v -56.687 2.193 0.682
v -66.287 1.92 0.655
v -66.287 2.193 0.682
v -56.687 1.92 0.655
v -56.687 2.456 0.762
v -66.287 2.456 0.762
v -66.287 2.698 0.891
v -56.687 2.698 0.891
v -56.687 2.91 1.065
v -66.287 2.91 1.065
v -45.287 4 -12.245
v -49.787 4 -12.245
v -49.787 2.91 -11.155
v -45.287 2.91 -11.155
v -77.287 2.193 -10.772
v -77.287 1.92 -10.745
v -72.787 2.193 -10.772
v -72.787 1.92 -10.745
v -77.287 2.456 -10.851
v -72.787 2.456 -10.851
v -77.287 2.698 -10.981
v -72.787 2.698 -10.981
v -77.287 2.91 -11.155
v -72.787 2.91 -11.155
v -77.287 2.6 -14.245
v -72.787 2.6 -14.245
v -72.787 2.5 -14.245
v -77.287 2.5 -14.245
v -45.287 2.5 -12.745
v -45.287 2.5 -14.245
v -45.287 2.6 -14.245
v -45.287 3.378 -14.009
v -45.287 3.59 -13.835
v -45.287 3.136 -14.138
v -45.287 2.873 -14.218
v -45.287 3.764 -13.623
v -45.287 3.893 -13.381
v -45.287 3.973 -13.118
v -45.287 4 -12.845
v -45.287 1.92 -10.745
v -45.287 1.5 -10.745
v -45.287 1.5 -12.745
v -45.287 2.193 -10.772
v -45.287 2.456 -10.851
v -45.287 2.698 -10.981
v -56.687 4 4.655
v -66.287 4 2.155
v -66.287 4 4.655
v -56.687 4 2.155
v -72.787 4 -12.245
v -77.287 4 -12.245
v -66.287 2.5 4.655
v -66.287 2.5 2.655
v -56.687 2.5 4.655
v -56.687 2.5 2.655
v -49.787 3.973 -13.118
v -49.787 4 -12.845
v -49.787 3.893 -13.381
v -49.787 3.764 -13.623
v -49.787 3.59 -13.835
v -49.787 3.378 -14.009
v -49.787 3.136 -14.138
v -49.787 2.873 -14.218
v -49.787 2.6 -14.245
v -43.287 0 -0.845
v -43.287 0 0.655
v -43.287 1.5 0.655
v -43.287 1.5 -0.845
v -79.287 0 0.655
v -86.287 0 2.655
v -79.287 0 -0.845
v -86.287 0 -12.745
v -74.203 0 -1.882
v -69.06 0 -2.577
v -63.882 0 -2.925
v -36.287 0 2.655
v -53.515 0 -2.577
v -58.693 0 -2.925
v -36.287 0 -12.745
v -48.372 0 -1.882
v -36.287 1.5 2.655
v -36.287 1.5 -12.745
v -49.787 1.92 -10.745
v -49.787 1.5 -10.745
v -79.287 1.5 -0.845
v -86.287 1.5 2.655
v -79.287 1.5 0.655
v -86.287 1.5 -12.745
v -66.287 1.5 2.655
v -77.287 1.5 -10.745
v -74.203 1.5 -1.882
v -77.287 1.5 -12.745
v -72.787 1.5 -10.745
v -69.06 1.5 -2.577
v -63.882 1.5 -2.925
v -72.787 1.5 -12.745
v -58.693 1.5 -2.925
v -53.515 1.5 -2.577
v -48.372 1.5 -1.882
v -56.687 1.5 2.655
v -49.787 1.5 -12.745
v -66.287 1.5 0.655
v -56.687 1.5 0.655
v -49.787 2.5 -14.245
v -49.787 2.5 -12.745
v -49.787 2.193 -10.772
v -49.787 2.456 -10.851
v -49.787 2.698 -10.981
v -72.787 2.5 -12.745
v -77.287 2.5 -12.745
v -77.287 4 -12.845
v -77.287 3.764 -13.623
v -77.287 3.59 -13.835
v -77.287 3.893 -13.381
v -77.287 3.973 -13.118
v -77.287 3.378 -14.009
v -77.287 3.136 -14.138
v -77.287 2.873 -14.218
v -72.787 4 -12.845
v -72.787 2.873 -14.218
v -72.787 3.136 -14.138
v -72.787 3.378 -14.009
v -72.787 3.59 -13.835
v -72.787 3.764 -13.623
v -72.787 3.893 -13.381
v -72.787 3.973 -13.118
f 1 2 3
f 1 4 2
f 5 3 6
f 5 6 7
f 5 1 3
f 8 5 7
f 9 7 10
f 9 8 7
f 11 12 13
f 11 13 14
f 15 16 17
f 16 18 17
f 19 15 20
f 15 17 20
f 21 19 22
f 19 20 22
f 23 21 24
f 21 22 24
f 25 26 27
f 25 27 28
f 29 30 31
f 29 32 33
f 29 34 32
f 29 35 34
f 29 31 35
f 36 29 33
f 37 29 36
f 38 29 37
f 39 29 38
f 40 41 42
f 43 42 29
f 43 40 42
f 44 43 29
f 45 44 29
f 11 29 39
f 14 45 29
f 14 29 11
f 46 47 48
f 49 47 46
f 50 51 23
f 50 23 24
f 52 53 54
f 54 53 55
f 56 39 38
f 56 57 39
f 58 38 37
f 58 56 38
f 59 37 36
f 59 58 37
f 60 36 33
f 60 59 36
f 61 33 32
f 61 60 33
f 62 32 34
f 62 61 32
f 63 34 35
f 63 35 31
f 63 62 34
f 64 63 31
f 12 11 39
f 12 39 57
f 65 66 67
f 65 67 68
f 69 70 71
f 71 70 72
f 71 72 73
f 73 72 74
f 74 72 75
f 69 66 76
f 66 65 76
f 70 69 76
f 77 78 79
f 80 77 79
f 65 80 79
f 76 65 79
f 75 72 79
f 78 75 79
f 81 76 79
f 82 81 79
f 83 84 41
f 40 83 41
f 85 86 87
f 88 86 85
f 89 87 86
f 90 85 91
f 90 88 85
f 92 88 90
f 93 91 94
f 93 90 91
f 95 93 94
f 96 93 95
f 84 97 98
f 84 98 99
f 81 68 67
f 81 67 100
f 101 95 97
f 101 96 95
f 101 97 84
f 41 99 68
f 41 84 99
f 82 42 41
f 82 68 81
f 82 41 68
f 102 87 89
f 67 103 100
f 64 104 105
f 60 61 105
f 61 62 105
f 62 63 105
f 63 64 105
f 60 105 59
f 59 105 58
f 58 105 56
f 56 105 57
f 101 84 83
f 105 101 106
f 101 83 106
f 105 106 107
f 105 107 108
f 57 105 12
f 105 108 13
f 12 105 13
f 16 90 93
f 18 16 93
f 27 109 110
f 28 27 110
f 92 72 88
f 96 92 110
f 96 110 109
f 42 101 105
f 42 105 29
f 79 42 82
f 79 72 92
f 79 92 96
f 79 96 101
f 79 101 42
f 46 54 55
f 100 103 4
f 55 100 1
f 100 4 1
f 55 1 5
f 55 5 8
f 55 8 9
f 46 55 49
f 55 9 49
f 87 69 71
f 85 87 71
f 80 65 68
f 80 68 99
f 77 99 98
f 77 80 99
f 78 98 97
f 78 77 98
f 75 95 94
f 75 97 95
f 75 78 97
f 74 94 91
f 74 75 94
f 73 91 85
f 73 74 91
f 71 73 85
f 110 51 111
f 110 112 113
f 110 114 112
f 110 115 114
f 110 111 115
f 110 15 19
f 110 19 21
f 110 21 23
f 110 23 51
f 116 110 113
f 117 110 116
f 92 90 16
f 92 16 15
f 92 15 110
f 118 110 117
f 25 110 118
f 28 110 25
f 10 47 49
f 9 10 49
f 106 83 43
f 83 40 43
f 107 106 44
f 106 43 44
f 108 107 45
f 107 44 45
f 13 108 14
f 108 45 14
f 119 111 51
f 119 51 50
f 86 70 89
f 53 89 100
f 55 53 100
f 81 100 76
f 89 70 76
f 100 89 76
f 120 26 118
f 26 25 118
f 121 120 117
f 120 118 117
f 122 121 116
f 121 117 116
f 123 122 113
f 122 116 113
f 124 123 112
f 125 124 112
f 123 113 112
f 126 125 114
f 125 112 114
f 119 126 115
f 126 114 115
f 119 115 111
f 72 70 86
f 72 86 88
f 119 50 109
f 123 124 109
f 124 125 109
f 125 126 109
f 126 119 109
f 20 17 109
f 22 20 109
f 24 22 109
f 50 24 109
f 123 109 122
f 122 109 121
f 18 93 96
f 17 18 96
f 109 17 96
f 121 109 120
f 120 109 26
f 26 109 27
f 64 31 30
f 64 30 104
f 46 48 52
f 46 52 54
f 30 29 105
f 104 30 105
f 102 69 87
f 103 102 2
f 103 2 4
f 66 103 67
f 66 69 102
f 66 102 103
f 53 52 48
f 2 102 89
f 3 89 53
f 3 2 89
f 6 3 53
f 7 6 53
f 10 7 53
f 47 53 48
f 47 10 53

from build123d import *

# Parameters (mm, degrees)
SKETCH1_W               = 50
SKETCH1_H               = 15.4
SKETCH1_W_2             = 36
SKETCH1_H_2             = 1.5
BOSS_EXTRUDE1_DEPTH     = 1.5
SKETCH2_W               = 9.6
SKETCH2_H               = 2
SKETCH2_W_2             = 4.5
BOSS_EXTRUDE2_DEPTH     = 2.5
CHAMFER3_SIZE           = 1.5
CHAMFER4_SIZE           = 1.5
FILLET3_R               = 1.4
SKETCH5_W               = 9.6
SKETCH5_H               = 1.5
BOSS_EXTRUDE4_DEPTH     = 2
FILLET4_R               = 1.4
SKETCH6_W               = 4.5
SKETCH6_H               = 1.5
BOSS_EXTRUDE5_DEPTH     = 1.5
FILLET5_R               = 1.4
CUT_EXTRUDE5_DEPTH      = 88.490987959
CUT_EXTRUDE5_DEPTH_BACK = 88.490987959


with BuildPart() as part:
    # Sketch1 → Boss-Extrude1 (new body)
    with BuildSketch(Plane(origin=(0, 0, 0), x_dir=(1, 0, 0), z_dir=(0, 1, 0))):
        with Locations((-61.287356322, 5.044827586)):
            Rectangle(SKETCH1_W, SKETCH1_H)
        with Locations((-61.287356322, 0.094827586)):
            Rectangle(SKETCH1_W_2, SKETCH1_H_2, mode=Mode.SUBTRACT)
    extrude(amount=BOSS_EXTRUDE1_DEPTH)

    # Sketch2 → Boss-Extrude2 (add)
    with BuildSketch(Plane(origin=(0, 1.5, 0), x_dir=(1, 0, 0), z_dir=(0, 1, 0))):
        with Locations((-61.487356322, -1.655172414)):
            Rectangle(SKETCH2_W, SKETCH2_H)
        with Locations((-75.037356322, 11.744827586)):
            Rectangle(SKETCH2_W_2, SKETCH2_H)
        with Locations((-47.537356322, 11.744827586)):
            Rectangle(SKETCH2_W_2, SKETCH2_H)
    extrude(amount=BOSS_EXTRUDE2_DEPTH)

    # Chamfer3
    chamfer3_edges = [part.edges().sort_by_distance(p)[0] for p in [
        (-75.037356322, 4, -10.744827586),
    ]]
    chamfer(chamfer3_edges, length=CHAMFER3_SIZE)

    # Chamfer4
    chamfer4_edges = [part.edges().sort_by_distance(p)[0] for p in [
        (-61.487356322, 4, 0.655172414),
        (-47.537356322, 4, -10.744827586),
    ]]
    chamfer(chamfer4_edges, length=CHAMFER4_SIZE)

    # Fillet3
    fillet3_edges = [part.edges().sort_by_distance(p)[0] for p in [
        (-75.037356322, 2.5, -10.744827586),
        (-47.537356322, 2.5, -10.744827586),
    ]]
    fillet(fillet3_edges, radius=FILLET3_R)

    # Sketch5 → Boss-Extrude4 (add)
    with BuildSketch(Plane.XY.offset(2.655172414)):
        with Locations((-61.487356322, 3.25)):
            Rectangle(SKETCH5_W, SKETCH5_H)
    extrude(amount=BOSS_EXTRUDE4_DEPTH)

    # Fillet4
    fillet4_edges = [part.edges().sort_by_distance(p)[0] for p in [
        (-61.487356322, 2.5, 0.655172414),
    ]]
    fillet(fillet4_edges, radius=FILLET4_R)

    # Sketch6 → Boss-Extrude5 (add)
    with BuildSketch(Plane(origin=(0, 0, -12.744827586), x_dir=(-1, 0, 0), z_dir=(0, 0, -1))):
        with Locations((47.537356322, 3.25)):
            Rectangle(SKETCH6_W, SKETCH6_H)
        with Locations((75.037356322, 3.25)):
            Rectangle(SKETCH6_W, SKETCH6_H)
    extrude(amount=BOSS_EXTRUDE5_DEPTH)

    # Fillet5
    fillet5_edges = [part.edges().sort_by_distance(p)[0] for p in [
        (-47.537356322, 4, -14.244827586),
        (-75.037356322, 4, -14.244827586),
    ]]
    fillet(fillet5_edges, radius=FILLET5_R)

    # Sketch7 → Cut-Extrude5 (cut, two sides: drawn at the far end of the back side and taken through both)
    with BuildSketch(Plane(origin=(0, 1.5, 0), x_dir=(1, 0, 0), z_dir=(0, 1, 0)).offset(-CUT_EXTRUDE5_DEPTH_BACK)):
        with BuildLine():
            Line((-79.287356322, 0.844827586), (-43.287356322, 0.844827586))
            ThreePointArc((-43.287356322, 0.844827586), (-61.287356322, 2.968136908), (-79.287356322, 0.844827586))
        make_face()
    extrude(amount=CUT_EXTRUDE5_DEPTH + CUT_EXTRUDE5_DEPTH_BACK, mode=Mode.SUBTRACT)


solid = part.part
